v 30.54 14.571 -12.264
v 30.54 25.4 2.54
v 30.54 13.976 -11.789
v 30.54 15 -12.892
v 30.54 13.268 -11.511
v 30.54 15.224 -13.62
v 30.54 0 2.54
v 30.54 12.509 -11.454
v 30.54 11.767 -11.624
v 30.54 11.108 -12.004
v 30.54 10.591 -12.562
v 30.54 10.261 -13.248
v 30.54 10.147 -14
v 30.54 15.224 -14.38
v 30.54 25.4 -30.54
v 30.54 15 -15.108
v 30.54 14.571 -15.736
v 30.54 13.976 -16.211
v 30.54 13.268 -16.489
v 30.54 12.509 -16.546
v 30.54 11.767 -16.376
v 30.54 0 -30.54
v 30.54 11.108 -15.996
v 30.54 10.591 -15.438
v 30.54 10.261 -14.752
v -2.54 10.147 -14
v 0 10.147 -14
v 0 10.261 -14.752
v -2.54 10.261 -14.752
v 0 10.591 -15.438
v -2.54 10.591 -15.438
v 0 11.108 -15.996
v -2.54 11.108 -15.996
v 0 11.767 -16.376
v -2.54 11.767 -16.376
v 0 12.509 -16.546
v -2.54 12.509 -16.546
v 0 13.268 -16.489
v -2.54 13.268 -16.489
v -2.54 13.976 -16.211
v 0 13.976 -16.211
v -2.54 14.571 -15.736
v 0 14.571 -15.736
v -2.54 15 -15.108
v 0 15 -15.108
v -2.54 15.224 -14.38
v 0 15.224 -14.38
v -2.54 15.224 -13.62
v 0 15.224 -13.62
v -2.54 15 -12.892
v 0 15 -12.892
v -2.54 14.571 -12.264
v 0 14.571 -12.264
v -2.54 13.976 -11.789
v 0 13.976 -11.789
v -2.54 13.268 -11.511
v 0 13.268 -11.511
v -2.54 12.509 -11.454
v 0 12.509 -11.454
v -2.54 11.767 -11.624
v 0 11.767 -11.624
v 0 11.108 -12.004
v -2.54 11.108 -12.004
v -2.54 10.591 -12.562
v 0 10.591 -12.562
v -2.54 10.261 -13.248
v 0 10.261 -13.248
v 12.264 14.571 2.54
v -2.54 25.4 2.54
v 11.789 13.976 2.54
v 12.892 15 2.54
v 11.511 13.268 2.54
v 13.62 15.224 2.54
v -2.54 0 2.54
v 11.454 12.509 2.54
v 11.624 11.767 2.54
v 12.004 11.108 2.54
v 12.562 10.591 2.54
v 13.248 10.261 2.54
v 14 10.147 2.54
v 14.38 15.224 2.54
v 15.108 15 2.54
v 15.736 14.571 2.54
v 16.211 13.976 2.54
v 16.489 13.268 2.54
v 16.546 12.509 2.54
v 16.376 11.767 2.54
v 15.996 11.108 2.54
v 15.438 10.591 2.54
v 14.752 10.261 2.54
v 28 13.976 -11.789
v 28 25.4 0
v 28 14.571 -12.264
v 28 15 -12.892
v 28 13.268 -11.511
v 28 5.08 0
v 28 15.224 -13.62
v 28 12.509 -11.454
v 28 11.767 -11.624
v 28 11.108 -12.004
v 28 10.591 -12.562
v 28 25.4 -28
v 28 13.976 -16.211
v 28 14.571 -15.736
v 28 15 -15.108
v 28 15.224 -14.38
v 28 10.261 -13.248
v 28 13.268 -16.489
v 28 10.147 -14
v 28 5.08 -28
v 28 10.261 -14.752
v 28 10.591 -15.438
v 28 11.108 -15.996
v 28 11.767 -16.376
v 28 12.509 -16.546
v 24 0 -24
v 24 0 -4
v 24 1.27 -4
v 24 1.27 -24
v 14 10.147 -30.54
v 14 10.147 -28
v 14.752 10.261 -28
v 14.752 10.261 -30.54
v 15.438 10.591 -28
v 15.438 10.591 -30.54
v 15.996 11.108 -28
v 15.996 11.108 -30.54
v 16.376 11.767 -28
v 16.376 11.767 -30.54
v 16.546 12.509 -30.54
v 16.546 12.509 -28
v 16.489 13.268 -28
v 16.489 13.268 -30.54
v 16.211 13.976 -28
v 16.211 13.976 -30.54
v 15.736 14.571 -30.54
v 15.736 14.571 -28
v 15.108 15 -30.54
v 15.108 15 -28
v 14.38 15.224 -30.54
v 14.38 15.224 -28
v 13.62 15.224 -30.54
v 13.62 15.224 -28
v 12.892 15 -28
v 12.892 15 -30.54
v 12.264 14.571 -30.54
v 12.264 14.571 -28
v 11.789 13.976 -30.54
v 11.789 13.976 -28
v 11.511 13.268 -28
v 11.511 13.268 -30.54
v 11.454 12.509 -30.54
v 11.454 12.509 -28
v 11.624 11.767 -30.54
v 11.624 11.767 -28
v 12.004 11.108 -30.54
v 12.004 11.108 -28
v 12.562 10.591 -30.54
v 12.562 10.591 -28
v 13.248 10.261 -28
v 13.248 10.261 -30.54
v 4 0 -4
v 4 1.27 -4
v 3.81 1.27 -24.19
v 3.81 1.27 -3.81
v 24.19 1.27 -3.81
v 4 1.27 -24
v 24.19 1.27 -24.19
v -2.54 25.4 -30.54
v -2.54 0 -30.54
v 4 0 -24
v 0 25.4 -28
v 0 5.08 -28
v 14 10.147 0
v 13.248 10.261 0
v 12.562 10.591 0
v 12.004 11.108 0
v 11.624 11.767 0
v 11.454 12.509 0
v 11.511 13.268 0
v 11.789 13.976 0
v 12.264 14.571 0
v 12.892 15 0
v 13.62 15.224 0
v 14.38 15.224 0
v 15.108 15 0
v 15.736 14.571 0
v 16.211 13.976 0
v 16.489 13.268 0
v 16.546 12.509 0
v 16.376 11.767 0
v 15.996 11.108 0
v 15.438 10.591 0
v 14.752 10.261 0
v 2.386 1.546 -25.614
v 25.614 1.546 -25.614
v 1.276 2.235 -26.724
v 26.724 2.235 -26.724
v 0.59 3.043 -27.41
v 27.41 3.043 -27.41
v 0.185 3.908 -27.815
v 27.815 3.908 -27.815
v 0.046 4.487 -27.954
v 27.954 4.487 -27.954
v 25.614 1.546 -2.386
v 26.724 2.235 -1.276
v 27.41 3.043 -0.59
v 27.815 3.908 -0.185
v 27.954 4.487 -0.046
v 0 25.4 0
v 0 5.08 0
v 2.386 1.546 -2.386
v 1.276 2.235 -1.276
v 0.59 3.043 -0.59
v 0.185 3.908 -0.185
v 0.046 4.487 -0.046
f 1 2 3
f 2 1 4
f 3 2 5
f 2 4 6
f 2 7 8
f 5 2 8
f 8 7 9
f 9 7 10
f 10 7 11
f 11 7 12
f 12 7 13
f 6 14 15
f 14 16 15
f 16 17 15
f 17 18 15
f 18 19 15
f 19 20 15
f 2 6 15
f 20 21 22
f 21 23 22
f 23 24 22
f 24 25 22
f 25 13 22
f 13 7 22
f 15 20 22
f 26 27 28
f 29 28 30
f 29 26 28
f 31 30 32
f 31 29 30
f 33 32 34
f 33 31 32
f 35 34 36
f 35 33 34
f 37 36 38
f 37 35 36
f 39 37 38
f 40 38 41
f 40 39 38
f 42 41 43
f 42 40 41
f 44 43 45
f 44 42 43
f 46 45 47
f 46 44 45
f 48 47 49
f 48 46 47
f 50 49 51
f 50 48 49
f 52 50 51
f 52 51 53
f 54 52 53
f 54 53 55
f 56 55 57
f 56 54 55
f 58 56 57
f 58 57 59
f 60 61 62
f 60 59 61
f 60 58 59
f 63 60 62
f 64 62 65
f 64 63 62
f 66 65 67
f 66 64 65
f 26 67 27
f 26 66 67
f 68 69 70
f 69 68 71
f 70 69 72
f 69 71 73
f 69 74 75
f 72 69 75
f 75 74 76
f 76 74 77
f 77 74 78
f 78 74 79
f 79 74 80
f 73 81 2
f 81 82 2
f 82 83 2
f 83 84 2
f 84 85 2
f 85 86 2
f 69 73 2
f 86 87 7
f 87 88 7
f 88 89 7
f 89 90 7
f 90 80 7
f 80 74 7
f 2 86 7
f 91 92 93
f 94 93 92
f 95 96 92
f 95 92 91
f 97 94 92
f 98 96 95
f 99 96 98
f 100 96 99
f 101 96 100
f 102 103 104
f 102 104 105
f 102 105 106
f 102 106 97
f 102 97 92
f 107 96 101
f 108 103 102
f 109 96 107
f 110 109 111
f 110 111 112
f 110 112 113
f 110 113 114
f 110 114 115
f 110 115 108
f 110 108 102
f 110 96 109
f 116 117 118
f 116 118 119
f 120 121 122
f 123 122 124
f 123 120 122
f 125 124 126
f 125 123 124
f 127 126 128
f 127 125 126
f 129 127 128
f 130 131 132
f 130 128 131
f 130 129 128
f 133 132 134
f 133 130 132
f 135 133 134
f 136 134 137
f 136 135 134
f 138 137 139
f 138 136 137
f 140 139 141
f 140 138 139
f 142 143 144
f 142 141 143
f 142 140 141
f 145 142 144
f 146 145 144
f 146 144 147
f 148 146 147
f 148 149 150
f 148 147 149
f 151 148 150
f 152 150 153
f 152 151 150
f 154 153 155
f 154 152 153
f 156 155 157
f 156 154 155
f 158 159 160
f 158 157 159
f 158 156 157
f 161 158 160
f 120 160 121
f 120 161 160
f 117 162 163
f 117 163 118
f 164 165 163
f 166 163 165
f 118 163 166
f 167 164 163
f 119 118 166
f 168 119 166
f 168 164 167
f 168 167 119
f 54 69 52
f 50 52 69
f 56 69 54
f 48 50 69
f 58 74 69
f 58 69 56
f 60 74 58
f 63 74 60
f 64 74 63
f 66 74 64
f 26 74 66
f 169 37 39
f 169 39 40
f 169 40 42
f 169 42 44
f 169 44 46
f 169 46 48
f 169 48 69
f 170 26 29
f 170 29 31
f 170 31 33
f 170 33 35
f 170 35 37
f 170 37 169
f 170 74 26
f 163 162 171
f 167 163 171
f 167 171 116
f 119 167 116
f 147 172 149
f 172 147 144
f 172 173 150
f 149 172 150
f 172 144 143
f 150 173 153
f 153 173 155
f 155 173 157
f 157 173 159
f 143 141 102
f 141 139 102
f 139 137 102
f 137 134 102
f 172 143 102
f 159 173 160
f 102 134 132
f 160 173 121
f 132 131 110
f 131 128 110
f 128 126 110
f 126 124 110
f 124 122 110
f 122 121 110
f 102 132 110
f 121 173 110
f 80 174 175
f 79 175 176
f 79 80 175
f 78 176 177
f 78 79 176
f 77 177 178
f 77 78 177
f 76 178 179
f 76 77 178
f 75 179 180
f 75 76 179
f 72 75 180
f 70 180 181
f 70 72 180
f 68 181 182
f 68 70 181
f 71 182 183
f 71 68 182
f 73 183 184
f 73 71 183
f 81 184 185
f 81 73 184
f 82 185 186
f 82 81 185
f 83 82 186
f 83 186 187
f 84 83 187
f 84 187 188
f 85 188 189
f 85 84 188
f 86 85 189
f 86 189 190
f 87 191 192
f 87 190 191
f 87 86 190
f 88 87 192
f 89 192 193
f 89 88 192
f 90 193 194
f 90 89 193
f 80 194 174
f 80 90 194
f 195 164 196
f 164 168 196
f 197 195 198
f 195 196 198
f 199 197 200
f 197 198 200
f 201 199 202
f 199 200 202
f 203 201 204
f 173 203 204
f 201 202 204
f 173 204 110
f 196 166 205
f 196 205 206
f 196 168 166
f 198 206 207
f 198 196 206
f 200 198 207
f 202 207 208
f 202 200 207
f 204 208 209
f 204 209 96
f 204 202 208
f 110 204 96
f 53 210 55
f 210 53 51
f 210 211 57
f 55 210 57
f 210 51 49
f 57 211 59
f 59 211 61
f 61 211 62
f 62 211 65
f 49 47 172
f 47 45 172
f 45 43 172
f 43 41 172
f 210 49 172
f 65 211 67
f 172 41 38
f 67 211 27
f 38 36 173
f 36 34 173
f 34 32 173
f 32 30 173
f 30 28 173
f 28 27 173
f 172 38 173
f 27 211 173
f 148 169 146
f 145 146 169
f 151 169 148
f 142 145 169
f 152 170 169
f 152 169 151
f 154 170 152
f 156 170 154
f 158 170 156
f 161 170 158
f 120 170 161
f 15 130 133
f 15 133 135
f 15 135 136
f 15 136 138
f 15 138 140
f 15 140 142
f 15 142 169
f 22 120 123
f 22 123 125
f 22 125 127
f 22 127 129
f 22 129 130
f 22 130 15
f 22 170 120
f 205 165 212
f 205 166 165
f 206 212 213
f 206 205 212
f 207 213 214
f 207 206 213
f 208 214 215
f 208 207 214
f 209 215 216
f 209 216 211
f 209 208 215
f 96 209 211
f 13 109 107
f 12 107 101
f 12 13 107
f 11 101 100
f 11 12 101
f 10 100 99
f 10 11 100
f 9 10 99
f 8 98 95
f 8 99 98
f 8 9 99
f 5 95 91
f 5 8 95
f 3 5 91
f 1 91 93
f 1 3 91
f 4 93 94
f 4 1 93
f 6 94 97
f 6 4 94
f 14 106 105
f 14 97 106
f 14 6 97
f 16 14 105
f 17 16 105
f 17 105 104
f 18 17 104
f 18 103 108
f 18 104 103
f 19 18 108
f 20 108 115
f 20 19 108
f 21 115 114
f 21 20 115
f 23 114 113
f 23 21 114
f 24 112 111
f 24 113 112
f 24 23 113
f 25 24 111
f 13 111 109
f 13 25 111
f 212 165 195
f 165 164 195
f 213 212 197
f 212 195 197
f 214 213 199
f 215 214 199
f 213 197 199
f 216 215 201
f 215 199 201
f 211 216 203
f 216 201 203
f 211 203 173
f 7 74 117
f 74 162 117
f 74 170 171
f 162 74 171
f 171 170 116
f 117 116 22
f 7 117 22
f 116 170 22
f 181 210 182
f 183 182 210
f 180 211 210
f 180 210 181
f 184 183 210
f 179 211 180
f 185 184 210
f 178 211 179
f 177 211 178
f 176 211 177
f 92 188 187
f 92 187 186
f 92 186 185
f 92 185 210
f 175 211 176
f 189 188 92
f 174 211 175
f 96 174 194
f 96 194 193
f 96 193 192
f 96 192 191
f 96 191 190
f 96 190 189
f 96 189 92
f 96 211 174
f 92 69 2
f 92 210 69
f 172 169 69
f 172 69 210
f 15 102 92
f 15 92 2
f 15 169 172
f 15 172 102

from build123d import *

# Parameters (mm, degrees)
SKETCH1_W           = 33.08
SKETCH1_H           = 33.08
SKETCH1_W_2         = 28
SKETCH1_H_2         = 28
EXTRUDE_THIN1_DEPTH = 25.4
CIRPATTERN1_COUNT   = 4
SKETCH1_3_W         = 28
SKETCH1_3_H         = 28
SKETCH1_3_W_2       = 20
SKETCH1_3_H_2       = 20
BOSS_EXTRUDE1_DEPTH = 1.27
FILLET1_R           = 3.81


with BuildPart() as part:
    # Sketch1 → Extrude-Thin1 (new body)
    with BuildSketch(Plane(origin=(0, 0, 0), x_dir=(1, 0, 0), z_dir=(0, 1, 0))):
        with Locations((14, 14)):
            Rectangle(SKETCH1_W, SKETCH1_H)
        with Locations((14, 14)):
            Rectangle(SKETCH1_W_2, SKETCH1_H_2, mode=Mode.SUBTRACT)
    extrude(amount=EXTRUDE_THIN1_DEPTH)

    # Sketch9 → Tap Drill for 1/4-20 Tap2 (revolve, cut)
    with BuildSketch(Plane(origin=(14, 12.7, 2.54), x_dir=(0, -1, 0), z_dir=(1, 0, 0))):
        Polygon((0, 0), (0, 9.153816902), (2.5527, 7.62), (2.5527, 0), align=None)
    tap_drill_for_1_4_20_tap2 = revolve(axis=Axis((14, 12.7, 8.89), (0, 0, -1)), mode=Mode.SUBTRACT)

    # CirPattern1: Tap Drill for 1/4-20 Tap2 ×4 about axis
    cirpattern1_axis = Axis((14, -1.27, -14), (0, 1, 0))
    for i in range(1, CIRPATTERN1_COUNT):
        add(tap_drill_for_1_4_20_tap2.rotate(cirpattern1_axis, i * 360 / CIRPATTERN1_COUNT), mode=Mode.SUBTRACT)

    # Sketch1<3> → Boss-Extrude1 (add)
    with BuildSketch(Plane(origin=(0, 0, 0), x_dir=(1, 0, 0), z_dir=(0, 1, 0))):
        with Locations((14, 14)):
            Rectangle(SKETCH1_3_W, SKETCH1_3_H)
        with Locations((14, 14)):
            Rectangle(SKETCH1_3_W_2, SKETCH1_3_H_2, mode=Mode.SUBTRACT)
    extrude(amount=BOSS_EXTRUDE1_DEPTH)

    # Fillet1
    fillet1_edges = [part.edges().sort_by_distance(p)[0] for p in [
        (0, 1.27, -14),
        (14, 1.27, 0),
        (28, 1.27, -14),
        (14, 1.27, -28),
    ]]
    fillet(fillet1_edges, radius=FILLET1_R)


solid = part.part
